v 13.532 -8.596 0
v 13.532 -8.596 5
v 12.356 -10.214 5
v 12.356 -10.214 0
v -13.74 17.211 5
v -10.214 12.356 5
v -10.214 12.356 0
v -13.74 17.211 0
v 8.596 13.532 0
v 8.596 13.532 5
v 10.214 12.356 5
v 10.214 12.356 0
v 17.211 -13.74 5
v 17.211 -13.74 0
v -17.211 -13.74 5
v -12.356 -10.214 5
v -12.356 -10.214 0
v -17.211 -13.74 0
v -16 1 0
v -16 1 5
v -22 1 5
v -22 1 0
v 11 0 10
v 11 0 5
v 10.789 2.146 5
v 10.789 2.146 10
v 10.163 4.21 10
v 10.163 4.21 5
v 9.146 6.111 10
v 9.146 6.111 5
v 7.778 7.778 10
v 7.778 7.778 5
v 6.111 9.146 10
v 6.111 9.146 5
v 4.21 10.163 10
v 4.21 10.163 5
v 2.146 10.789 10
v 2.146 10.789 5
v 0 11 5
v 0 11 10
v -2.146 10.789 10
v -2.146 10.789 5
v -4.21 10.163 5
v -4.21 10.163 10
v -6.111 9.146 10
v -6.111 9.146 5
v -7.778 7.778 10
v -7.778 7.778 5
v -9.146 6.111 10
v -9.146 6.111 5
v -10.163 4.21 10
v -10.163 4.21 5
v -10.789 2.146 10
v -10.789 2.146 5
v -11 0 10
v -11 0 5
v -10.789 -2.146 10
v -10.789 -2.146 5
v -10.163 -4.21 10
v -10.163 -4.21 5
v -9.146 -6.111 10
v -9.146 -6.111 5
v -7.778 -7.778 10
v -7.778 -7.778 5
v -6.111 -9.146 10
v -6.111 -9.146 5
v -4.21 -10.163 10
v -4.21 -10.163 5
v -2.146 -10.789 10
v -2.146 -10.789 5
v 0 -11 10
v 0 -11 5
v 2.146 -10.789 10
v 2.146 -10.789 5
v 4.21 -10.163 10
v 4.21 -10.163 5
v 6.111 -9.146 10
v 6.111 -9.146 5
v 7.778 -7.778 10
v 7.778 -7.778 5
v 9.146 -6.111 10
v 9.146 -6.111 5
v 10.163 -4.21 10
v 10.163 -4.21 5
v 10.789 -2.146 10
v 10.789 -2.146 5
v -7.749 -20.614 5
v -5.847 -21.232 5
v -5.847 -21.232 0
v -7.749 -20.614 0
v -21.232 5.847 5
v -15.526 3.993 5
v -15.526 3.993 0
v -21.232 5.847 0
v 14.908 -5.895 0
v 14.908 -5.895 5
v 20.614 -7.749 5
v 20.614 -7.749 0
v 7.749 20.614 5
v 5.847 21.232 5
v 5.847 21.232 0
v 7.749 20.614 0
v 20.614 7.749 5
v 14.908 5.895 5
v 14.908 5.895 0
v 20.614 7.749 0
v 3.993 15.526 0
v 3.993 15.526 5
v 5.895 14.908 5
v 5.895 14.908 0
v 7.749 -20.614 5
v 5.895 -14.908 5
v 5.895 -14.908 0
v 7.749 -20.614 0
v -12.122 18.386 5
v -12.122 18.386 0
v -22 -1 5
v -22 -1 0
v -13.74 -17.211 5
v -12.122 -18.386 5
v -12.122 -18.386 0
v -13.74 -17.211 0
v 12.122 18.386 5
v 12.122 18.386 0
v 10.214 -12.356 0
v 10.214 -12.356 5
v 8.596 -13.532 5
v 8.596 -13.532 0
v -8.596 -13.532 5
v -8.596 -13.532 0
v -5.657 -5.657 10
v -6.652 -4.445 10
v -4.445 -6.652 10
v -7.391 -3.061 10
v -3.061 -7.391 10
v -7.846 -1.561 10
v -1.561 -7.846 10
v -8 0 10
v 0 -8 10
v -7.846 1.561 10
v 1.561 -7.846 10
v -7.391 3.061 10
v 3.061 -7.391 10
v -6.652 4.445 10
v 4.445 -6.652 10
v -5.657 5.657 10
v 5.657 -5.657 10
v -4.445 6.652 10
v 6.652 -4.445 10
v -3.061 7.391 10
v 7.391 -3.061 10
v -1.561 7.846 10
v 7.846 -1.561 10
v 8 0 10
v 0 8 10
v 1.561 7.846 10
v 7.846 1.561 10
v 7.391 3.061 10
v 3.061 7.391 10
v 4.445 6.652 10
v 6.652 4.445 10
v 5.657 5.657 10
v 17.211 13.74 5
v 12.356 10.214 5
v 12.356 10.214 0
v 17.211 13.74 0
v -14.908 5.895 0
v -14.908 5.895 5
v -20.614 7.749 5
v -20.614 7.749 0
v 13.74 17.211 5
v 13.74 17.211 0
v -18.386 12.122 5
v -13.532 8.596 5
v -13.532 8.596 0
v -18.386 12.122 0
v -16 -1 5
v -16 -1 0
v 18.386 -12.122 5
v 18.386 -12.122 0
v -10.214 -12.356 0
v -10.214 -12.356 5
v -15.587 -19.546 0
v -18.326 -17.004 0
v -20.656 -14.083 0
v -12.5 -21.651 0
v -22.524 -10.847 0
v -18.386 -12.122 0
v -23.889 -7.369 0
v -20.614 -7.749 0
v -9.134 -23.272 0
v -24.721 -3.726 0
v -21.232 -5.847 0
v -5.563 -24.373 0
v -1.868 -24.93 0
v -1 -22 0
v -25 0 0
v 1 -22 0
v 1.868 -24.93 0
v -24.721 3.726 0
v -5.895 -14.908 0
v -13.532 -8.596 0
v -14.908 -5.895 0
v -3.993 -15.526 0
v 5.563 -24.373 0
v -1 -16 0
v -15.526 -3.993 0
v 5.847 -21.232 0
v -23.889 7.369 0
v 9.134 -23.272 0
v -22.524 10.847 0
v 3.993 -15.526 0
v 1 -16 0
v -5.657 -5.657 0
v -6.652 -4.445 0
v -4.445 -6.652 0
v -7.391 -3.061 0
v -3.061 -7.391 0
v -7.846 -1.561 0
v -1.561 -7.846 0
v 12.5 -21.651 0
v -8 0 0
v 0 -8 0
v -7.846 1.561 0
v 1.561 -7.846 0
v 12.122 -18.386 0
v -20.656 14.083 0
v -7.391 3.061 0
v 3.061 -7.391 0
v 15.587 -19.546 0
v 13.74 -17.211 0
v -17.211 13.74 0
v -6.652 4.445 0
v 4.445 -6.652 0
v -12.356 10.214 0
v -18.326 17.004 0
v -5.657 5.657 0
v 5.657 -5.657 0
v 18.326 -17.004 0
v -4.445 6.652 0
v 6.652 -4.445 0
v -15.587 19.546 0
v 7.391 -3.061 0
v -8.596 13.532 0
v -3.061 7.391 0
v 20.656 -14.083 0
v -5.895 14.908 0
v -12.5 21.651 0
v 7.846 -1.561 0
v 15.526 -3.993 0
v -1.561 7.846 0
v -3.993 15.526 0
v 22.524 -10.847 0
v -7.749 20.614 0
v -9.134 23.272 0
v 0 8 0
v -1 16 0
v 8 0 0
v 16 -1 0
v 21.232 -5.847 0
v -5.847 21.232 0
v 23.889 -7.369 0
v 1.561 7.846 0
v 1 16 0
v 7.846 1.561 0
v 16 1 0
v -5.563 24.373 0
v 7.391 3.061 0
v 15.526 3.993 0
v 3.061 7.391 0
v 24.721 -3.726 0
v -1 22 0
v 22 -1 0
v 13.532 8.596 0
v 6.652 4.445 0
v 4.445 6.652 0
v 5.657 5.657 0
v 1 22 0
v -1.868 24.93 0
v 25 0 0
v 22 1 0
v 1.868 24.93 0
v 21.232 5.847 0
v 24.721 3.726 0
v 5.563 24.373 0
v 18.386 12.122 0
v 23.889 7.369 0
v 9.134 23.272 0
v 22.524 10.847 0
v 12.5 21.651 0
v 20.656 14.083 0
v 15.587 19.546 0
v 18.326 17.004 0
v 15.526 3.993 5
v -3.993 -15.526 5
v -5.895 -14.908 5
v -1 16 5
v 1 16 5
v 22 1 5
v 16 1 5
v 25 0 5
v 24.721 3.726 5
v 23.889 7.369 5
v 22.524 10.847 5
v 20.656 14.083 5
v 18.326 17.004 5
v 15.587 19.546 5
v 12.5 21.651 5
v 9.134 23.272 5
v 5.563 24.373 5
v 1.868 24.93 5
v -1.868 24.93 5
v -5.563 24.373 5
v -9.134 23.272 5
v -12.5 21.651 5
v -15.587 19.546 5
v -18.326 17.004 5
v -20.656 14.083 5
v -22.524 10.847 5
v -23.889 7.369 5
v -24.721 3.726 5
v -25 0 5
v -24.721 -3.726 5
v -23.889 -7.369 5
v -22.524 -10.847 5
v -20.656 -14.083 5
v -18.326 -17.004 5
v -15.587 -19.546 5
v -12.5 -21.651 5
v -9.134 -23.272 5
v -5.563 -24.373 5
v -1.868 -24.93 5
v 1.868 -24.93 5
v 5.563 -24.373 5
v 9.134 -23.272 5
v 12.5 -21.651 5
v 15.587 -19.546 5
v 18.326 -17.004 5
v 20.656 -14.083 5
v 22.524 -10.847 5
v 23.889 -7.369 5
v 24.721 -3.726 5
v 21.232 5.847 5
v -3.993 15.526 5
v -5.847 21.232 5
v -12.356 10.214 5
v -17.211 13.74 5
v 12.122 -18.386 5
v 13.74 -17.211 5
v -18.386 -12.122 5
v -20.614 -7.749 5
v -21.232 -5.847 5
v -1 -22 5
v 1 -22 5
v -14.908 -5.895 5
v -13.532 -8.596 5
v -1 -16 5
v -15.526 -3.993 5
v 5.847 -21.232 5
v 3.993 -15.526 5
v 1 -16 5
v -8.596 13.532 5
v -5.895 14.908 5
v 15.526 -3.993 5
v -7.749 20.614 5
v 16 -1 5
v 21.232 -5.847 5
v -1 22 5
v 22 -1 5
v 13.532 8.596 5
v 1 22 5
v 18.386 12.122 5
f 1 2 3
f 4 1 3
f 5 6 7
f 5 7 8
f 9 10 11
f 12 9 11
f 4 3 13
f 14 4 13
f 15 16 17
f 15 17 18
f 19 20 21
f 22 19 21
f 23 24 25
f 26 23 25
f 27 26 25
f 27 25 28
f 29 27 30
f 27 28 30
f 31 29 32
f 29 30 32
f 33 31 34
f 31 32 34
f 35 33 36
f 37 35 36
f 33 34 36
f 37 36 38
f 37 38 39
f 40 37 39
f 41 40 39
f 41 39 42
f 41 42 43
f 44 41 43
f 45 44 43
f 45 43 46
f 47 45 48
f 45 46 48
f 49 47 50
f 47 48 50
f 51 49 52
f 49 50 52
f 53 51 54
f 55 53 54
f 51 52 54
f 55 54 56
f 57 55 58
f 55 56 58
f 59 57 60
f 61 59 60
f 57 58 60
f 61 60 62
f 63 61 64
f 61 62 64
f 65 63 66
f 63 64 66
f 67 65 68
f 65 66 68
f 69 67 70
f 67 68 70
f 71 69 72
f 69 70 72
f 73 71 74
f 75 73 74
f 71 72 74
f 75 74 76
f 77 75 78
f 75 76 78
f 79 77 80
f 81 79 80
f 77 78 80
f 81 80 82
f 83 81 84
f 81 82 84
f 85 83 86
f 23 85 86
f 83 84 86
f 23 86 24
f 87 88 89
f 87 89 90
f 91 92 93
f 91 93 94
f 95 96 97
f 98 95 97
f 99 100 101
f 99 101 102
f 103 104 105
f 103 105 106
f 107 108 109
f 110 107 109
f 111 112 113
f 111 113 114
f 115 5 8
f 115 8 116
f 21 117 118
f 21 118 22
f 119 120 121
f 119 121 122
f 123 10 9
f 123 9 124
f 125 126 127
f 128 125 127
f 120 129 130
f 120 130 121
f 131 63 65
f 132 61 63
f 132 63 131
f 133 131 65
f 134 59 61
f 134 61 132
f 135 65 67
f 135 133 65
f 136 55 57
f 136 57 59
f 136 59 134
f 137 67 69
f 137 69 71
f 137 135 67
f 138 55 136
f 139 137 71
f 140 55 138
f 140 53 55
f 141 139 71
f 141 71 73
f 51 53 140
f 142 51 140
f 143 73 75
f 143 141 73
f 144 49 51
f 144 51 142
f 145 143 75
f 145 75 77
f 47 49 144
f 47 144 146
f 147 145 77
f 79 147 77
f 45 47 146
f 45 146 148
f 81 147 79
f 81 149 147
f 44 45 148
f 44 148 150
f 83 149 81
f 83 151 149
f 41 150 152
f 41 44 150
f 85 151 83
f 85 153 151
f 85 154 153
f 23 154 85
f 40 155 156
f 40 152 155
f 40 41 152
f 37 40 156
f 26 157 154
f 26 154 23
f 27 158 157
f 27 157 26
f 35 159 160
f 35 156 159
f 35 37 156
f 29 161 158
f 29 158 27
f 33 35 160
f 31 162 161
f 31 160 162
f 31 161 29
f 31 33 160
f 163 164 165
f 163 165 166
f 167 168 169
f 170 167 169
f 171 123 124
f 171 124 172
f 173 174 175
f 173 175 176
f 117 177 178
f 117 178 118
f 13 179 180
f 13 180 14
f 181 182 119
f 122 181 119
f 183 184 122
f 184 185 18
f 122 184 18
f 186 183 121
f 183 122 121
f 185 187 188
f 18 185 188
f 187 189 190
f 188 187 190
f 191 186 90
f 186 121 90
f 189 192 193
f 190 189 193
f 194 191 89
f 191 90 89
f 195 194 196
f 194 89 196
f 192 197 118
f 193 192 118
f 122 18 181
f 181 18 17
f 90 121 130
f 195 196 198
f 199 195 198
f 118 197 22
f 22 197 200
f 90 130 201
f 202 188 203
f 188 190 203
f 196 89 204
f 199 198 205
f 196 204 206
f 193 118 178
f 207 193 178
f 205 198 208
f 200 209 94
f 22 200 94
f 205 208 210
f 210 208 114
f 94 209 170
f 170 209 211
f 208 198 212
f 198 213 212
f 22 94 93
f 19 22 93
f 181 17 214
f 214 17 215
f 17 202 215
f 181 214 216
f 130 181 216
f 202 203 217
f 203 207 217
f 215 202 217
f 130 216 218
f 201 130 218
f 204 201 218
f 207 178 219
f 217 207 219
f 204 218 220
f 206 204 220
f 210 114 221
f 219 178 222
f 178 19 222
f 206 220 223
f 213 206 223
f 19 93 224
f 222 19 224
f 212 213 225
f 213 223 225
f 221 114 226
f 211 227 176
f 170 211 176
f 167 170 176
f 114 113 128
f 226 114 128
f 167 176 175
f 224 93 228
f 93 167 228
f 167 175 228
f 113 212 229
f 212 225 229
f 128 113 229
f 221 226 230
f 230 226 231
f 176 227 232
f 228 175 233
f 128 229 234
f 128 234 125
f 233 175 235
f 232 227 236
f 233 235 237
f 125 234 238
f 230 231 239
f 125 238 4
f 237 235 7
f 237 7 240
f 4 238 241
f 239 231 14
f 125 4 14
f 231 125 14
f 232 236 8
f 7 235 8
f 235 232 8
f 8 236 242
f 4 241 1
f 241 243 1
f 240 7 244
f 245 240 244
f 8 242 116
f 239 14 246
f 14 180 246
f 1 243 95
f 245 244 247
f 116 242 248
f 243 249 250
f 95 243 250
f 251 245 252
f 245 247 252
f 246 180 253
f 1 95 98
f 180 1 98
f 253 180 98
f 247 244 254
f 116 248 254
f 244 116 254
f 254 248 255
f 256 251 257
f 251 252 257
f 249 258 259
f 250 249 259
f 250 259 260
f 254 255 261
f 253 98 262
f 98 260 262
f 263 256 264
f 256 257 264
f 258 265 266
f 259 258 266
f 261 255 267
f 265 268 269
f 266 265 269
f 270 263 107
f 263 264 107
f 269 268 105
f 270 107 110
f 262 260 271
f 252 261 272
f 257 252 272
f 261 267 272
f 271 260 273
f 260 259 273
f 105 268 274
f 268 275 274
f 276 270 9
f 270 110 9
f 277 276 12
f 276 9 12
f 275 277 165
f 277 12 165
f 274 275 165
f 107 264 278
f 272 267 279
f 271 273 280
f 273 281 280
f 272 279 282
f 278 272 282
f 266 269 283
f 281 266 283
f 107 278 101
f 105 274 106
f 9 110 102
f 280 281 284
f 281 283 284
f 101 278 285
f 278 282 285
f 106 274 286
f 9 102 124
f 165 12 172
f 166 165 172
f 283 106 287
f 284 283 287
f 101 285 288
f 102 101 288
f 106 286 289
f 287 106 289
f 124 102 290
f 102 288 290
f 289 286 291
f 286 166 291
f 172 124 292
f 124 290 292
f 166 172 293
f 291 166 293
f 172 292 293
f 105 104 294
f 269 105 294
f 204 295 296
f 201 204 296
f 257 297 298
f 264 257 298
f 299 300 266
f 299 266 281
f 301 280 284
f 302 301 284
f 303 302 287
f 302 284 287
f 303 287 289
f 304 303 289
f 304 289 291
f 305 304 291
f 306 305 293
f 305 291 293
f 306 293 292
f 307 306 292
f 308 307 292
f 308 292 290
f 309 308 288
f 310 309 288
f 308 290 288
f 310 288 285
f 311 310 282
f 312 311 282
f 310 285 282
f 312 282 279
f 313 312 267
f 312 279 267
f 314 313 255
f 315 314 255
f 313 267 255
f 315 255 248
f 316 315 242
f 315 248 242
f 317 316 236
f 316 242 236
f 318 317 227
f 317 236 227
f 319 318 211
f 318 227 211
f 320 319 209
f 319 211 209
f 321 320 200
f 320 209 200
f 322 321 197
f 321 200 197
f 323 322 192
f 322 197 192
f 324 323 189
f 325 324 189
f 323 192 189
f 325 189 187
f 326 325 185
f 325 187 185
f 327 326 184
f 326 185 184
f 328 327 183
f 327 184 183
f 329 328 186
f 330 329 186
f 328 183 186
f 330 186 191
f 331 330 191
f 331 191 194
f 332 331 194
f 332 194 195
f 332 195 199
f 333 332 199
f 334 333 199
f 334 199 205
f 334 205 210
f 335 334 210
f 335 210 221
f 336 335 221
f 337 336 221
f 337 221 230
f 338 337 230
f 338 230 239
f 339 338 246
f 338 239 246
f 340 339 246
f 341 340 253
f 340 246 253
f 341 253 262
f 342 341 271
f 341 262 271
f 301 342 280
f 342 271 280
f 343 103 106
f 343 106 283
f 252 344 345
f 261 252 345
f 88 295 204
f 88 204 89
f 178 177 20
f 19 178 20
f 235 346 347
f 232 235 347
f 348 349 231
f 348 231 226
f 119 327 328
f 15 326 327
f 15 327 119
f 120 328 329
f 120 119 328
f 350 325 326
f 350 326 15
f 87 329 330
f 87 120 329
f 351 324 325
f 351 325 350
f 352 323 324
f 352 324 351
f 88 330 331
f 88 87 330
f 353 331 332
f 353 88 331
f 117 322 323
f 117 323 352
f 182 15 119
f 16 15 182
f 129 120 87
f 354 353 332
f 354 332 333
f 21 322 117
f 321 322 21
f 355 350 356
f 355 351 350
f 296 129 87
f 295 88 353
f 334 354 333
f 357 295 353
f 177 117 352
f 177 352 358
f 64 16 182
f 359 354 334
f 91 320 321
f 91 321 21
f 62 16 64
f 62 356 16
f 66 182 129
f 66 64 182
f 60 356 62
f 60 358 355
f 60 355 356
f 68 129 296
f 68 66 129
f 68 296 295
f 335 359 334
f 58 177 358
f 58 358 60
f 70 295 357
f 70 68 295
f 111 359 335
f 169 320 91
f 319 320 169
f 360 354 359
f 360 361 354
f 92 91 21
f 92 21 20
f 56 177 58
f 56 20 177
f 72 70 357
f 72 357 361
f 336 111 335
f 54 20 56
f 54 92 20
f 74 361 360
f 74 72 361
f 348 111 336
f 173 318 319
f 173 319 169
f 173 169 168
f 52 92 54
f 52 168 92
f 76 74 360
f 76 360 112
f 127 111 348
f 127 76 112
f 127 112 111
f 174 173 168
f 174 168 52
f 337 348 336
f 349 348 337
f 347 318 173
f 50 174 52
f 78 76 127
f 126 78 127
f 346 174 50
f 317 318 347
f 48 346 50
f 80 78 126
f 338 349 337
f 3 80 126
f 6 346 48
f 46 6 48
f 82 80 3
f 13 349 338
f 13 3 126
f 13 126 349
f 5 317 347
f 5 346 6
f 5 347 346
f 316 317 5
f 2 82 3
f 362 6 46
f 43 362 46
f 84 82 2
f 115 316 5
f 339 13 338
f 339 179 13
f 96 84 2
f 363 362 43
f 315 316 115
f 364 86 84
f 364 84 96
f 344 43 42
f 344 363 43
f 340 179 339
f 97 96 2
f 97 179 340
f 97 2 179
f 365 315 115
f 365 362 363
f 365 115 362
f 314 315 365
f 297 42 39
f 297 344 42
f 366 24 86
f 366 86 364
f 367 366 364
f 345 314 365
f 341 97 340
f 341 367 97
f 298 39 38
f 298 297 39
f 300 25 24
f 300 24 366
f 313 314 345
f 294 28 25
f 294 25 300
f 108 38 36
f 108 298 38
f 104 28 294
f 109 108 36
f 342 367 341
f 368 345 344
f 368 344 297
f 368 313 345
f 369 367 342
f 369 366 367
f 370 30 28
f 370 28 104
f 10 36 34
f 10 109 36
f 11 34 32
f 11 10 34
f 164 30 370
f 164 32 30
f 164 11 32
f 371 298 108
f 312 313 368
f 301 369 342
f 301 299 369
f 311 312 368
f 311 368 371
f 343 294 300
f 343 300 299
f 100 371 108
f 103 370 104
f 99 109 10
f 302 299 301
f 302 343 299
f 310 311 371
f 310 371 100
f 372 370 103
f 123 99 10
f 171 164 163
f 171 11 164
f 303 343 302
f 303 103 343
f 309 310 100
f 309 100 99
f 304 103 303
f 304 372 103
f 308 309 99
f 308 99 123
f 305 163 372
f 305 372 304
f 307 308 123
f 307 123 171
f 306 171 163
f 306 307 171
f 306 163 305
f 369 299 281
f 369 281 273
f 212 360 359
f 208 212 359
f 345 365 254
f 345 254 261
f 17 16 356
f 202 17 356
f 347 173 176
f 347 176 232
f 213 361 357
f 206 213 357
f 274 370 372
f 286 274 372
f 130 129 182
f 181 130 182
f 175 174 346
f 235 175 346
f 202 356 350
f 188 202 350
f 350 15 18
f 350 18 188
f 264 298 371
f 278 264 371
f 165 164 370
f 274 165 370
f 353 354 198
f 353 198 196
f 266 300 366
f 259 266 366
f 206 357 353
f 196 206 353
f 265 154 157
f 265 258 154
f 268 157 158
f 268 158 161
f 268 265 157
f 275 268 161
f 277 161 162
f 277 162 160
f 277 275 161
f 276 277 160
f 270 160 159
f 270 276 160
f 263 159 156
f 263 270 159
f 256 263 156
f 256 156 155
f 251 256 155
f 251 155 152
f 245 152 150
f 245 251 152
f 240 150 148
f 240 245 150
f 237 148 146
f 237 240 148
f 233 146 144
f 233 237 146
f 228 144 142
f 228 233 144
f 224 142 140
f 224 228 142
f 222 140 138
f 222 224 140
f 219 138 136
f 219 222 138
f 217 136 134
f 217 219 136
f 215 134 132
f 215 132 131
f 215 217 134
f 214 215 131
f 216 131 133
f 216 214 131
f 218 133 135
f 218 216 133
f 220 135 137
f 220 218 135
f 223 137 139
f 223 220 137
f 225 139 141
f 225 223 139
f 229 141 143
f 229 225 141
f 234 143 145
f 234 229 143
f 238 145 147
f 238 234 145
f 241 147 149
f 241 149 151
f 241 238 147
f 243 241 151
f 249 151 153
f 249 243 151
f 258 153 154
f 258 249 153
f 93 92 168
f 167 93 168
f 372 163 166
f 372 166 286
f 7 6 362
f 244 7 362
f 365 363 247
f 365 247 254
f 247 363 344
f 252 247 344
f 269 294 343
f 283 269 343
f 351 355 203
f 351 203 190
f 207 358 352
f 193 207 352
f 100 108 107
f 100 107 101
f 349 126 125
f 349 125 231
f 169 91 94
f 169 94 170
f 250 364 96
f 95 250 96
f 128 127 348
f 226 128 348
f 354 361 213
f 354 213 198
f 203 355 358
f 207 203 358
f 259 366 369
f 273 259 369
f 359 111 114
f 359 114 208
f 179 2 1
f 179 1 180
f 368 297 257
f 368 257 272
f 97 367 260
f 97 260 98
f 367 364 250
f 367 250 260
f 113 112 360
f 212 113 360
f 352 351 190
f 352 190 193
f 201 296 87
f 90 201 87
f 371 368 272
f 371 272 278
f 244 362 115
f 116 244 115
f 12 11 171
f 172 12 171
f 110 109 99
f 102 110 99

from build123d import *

# Parameters (mm, degrees)
SKETCH_1_R               = 25
SKETCH_1_R_2             = 8
EXTRUDE_1_DEPTH          = 5
SKETCH_2_R               = 11
SKETCH_2_R_2             = 8
EXTRUDE_2_DEPTH          = 5
SKETCH_3_W               = 2
SKETCH_3_H               = 6
CUT_EXTRUDE_1_DEPTH      = 5
PATTERN_CIRCULAR_1_COUNT = 20


with BuildPart() as part:
    # 草图1 → 凸台-拉伸1 (new body)
    with BuildSketch(Plane.XY):
        Circle(SKETCH_1_R)
        Circle(SKETCH_1_R_2, mode=Mode.SUBTRACT)
    extrude(amount=EXTRUDE_1_DEPTH)

    # 草图2 → 凸台-拉伸2 (add)
    with BuildSketch(Plane.XY.offset(5)):
        Circle(SKETCH_2_R)
        Circle(SKETCH_2_R_2, mode=Mode.SUBTRACT)
    extrude(amount=EXTRUDE_2_DEPTH)

    # 草图3 → 切除-拉伸1 (cut)
    with BuildSketch(Plane.XY.offset(5)):
        with Locations((0, 19)):
            Rectangle(SKETCH_3_W, SKETCH_3_H)
    cut_extrude_1 = extrude(amount=-CUT_EXTRUDE_1_DEPTH, mode=Mode.SUBTRACT)

    # 阵列(圆周)1: 切除-拉伸1 ×20 about axis
    pattern_circular_1_axis = Axis((0, 0, 0), (0, 0, 1))
    for i in range(1, PATTERN_CIRCULAR_1_COUNT):
        add(cut_extrude_1.rotate(pattern_circular_1_axis, i * 360 / PATTERN_CIRCULAR_1_COUNT), mode=Mode.SUBTRACT)


solid = part.part
